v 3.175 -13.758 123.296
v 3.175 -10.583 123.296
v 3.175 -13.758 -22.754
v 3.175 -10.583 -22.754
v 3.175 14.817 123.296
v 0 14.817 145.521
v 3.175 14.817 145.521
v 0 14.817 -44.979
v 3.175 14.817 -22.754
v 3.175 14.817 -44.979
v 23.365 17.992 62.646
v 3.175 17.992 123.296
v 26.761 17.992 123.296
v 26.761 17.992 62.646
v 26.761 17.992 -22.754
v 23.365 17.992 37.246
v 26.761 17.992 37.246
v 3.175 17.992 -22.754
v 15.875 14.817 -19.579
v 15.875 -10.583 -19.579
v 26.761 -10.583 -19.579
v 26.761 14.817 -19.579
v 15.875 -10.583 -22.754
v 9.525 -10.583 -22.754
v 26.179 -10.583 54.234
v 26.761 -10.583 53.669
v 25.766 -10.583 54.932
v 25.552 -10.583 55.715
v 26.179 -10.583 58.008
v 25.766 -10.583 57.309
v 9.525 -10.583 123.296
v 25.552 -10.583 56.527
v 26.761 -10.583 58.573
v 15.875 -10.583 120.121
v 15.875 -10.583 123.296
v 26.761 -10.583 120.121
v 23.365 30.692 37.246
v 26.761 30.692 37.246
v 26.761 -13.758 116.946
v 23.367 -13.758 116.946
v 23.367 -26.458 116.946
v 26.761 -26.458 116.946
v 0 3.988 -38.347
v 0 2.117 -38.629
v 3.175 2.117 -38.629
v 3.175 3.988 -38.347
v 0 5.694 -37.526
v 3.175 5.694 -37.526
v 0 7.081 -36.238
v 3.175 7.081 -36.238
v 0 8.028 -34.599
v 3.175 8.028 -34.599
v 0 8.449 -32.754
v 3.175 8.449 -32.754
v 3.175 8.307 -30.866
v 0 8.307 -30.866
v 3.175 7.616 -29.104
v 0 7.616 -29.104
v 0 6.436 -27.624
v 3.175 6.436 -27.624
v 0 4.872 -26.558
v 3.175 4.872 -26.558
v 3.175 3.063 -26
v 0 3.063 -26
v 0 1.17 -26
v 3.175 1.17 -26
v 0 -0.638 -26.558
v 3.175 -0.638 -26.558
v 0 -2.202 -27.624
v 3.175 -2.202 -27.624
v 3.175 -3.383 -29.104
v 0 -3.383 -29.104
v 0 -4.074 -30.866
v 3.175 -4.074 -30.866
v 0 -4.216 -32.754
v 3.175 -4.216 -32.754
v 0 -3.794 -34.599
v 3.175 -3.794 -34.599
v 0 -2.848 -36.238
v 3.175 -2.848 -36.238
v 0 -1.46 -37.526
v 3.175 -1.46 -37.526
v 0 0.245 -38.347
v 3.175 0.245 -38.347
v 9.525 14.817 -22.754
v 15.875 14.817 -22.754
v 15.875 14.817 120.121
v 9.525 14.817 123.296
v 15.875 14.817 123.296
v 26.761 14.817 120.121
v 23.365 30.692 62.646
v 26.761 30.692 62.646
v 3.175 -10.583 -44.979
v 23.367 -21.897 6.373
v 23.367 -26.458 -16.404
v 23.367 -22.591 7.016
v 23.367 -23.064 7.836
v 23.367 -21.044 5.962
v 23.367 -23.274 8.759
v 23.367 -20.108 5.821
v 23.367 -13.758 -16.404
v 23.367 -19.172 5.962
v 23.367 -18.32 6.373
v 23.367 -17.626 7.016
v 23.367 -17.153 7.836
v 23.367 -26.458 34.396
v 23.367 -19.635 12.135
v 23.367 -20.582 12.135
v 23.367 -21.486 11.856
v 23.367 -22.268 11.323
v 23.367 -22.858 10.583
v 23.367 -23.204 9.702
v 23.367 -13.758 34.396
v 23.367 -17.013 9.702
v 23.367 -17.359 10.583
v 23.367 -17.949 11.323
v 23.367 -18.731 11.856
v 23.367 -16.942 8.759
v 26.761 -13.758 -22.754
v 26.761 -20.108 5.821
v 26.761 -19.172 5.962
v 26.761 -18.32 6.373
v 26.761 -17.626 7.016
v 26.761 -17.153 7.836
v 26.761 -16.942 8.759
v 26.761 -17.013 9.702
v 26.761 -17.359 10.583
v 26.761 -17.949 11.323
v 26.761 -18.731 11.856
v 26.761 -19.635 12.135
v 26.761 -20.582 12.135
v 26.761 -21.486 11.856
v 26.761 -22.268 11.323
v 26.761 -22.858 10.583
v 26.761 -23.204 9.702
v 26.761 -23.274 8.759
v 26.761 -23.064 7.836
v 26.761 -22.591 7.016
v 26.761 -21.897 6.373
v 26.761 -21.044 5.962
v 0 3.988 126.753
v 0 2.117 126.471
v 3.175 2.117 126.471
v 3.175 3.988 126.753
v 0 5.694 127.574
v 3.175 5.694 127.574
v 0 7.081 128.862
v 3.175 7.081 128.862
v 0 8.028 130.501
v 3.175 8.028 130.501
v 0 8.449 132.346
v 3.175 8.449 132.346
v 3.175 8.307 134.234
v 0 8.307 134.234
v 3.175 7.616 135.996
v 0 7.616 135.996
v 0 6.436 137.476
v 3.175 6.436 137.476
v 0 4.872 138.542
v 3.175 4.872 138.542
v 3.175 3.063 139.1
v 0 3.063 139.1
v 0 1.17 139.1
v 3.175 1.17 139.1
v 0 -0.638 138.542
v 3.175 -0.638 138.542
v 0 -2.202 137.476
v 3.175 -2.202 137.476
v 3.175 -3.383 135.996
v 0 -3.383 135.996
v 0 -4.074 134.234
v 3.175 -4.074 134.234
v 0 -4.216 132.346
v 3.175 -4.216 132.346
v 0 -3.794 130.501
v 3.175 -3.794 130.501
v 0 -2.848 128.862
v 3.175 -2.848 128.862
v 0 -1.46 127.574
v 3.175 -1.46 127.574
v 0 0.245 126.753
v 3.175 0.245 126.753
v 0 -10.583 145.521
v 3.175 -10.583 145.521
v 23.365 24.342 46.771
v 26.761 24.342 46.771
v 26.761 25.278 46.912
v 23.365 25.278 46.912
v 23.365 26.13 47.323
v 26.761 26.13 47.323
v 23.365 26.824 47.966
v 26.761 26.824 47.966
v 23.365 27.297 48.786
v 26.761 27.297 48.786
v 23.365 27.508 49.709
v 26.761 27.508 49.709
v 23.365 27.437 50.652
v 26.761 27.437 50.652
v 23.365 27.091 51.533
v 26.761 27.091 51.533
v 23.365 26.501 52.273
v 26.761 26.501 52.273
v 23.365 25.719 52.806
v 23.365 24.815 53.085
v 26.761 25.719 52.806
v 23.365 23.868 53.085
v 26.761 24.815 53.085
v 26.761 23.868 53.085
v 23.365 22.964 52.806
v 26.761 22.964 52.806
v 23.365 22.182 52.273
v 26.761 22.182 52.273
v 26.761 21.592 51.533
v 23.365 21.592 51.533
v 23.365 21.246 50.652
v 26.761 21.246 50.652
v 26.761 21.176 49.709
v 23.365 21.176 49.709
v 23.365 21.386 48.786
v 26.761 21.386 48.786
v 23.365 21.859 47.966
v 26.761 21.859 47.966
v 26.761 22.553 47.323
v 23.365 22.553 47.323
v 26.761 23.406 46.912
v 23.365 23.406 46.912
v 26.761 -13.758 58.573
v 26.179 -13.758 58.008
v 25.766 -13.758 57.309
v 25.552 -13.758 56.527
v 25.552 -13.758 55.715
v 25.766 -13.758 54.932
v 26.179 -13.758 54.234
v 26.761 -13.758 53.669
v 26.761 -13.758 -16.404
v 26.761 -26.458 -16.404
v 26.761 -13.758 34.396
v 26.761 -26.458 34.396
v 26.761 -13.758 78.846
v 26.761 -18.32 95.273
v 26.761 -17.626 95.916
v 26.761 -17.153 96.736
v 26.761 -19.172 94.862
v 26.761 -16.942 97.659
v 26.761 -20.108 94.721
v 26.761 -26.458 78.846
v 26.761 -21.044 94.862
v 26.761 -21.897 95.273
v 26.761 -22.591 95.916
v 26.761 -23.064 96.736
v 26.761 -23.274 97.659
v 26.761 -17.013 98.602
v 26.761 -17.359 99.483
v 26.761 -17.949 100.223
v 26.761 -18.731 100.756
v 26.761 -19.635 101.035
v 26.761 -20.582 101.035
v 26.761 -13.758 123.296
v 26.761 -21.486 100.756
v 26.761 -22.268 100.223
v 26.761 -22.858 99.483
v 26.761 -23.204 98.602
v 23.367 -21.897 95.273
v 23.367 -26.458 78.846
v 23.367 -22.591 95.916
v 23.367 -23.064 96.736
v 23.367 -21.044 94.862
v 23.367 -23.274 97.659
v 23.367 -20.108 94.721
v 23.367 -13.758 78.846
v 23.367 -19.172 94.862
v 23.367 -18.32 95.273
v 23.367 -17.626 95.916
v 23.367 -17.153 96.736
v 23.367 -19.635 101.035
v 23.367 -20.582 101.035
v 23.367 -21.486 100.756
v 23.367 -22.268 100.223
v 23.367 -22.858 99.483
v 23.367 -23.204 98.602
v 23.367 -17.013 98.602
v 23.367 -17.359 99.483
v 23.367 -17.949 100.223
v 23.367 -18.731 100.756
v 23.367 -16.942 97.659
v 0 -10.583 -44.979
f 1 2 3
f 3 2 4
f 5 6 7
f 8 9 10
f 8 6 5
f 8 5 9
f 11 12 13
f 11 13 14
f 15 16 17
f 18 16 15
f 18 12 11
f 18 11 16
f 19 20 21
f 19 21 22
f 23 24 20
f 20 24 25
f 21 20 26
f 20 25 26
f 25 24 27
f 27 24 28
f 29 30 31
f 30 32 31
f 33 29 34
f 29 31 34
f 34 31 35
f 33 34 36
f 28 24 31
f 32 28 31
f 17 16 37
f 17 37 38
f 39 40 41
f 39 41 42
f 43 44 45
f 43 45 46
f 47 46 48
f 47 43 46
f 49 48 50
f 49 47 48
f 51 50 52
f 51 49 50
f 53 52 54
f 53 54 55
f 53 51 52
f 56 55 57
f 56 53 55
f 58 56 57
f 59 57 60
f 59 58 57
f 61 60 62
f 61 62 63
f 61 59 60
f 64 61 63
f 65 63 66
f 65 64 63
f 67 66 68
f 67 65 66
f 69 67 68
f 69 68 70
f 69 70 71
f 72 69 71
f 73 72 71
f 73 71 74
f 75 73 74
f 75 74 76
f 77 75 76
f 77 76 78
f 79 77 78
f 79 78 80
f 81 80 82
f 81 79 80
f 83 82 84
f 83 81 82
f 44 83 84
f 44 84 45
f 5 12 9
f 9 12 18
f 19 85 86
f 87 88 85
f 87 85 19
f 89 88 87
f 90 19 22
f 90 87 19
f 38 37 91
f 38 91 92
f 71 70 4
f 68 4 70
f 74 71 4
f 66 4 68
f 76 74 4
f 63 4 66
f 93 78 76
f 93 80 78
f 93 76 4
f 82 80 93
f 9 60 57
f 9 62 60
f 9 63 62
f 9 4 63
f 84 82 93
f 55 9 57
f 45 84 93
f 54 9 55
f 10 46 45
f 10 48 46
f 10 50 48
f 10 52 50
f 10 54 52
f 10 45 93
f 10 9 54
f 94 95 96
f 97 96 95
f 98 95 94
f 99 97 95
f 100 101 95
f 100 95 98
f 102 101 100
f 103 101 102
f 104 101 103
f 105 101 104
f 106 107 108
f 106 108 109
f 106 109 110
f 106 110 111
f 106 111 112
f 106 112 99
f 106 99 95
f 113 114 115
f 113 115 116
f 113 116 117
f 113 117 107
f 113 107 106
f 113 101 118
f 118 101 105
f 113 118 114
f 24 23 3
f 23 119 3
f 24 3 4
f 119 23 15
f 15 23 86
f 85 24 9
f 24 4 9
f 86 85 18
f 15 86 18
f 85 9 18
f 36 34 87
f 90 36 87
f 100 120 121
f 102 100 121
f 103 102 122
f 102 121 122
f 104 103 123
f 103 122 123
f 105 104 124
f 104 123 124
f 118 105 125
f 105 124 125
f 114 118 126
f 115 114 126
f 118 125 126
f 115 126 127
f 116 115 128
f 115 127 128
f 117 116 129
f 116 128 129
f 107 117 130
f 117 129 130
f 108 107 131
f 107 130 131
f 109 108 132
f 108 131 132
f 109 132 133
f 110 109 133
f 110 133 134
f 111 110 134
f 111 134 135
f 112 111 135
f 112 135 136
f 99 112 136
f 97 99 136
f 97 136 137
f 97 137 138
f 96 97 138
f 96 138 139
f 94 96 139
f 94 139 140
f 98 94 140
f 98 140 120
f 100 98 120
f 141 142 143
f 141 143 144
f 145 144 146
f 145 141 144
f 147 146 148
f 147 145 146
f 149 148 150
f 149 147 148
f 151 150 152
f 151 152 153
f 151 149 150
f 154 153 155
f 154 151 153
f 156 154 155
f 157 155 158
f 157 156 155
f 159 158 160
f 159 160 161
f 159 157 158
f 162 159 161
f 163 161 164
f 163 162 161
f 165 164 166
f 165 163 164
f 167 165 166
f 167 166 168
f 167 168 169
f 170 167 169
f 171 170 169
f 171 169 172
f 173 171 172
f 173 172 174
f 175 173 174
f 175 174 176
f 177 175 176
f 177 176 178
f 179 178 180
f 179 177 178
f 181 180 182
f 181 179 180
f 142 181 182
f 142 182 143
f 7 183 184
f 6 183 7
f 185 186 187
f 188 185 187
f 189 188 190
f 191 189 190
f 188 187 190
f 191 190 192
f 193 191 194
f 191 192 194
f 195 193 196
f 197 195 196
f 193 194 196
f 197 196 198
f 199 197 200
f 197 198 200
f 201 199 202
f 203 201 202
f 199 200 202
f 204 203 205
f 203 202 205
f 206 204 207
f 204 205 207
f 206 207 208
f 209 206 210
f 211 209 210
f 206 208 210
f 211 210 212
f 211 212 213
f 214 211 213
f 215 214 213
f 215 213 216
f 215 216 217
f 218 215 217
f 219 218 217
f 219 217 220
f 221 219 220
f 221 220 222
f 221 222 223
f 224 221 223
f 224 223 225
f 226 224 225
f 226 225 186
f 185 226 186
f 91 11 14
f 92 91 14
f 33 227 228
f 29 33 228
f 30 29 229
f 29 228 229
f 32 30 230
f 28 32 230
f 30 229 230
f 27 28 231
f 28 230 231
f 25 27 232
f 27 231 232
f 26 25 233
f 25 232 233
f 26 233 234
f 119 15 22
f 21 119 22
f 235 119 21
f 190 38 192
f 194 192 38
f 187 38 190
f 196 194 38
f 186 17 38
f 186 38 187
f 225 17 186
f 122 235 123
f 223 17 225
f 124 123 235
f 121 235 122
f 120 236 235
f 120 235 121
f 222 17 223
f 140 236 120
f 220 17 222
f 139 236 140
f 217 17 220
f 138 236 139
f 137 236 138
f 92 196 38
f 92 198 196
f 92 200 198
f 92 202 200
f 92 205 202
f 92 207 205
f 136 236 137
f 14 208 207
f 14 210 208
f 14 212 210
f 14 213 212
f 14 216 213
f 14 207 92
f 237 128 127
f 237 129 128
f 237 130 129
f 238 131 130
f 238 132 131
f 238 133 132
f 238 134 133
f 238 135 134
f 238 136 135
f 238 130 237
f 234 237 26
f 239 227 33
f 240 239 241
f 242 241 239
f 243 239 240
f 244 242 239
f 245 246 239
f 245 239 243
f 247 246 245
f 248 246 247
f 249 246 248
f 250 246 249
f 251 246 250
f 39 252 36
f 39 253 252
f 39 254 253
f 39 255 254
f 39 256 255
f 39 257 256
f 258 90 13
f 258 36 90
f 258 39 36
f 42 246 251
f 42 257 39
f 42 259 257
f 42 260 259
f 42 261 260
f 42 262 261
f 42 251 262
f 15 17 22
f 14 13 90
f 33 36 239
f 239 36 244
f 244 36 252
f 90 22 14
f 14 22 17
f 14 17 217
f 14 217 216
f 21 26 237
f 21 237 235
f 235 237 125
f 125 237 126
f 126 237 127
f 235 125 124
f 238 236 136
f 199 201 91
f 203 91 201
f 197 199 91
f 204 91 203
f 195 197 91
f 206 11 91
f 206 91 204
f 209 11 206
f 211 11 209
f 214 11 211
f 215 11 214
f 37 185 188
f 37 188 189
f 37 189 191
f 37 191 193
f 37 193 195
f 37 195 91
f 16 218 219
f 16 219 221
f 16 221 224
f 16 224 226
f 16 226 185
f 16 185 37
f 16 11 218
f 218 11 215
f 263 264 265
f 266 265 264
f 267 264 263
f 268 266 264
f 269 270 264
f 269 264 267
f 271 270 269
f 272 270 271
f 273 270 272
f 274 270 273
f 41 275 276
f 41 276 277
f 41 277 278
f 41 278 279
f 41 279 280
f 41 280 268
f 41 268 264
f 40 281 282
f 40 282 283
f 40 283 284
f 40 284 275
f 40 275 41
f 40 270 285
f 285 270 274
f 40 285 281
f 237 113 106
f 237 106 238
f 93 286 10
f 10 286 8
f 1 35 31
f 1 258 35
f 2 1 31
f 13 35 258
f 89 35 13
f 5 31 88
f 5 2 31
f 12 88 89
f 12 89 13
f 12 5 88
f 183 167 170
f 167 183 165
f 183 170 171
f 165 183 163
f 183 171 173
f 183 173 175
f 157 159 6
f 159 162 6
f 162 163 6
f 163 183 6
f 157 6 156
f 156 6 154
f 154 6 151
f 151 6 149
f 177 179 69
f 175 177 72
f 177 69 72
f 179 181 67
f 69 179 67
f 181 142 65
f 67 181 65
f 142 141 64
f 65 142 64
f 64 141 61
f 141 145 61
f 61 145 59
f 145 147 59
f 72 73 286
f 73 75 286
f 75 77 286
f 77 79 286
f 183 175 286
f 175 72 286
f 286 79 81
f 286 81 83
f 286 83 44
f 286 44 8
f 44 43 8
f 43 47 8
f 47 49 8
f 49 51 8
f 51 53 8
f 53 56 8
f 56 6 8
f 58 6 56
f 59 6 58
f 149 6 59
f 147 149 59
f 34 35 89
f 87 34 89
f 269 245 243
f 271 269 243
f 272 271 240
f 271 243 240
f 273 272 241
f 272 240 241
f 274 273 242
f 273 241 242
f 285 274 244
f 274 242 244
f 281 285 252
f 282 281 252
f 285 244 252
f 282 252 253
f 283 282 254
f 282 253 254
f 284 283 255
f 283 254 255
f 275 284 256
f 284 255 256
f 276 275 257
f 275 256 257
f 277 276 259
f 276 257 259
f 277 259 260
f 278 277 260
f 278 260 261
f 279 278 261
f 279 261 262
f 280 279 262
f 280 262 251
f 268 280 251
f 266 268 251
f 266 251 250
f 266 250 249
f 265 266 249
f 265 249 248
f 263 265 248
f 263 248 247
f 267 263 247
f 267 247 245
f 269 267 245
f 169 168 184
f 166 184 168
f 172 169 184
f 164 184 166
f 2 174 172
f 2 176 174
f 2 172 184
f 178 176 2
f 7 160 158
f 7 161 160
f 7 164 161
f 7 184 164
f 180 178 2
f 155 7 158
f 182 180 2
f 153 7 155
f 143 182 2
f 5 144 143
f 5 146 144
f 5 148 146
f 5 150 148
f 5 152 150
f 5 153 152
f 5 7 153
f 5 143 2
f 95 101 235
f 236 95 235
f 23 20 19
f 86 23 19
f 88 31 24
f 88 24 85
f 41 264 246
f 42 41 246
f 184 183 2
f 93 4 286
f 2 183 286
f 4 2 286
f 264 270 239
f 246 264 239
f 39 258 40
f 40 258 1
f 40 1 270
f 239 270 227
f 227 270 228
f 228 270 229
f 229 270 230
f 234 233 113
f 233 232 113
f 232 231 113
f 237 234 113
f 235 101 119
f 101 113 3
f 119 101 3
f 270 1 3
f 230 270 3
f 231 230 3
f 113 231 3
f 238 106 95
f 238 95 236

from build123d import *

# Parameters (mm, degrees)
SKETCH1_W               = 190.5
SKETCH1_H               = 25.4
SKETCH1_R               = 6.35
BOSS_EXTRUDE1_DEPTH     = 3.175
SKETCH2_W               = 146.05
SKETCH2_H               = 3.175
BOSS_EXTRUDE2_DEPTH     = 47.625
BOSS_EXTRUDE2_2_DEPTH   = 47.625
SKETCH3_W               = 146.05
SKETCH3_H               = 25.4
BOSS_EXTRUDE4_DEPTH     = 6.35
SKETCH4_W               = 3.175
SKETCH4_H               = 25.4
BOSS_EXTRUDE5_DEPTH     = 41.275
SKETCH5_W               = 6.35
SKETCH5_H               = 25.4
CUT_EXTRUDE1_DEPTH      = 165.45
SKETCH7_W               = 146.05
SKETCH7_H               = 31.75
BOSS_EXTRUDE7_DEPTH     = 3.175
FILLET1_R               = 10
SKETCH8_R               = 3.05
CUT_EXTRUDE2_DEPTH      = 3.175
SKETCH9_W               = 6.35
SKETCH9_H               = 38.1
SKETCH9_H_2             = 50.8
BOSS_EXTRUDE8_DEPTH     = 12.7
SKETCH10_R              = 3.175
CUT_EXTRUDE3_DEPTH      = 12.7
SKETCH11_W              = 6.35
SKETCH11_H              = 25.4
BOSS_EXTRUDE9_DEPTH     = 12.7
SKETCH12_R              = 3.175
CUT_EXTRUDE4_DEPTH      = 12.7
SKETCH13_W              = 28.740264125
SKETCH13_H              = 146.120317421
CUT_EXTRUDE5_DEPTH      = 50.8
CUT_EXTRUDE5_DEPTH_BACK = 50.8


with BuildPart() as part:
    # Sketch1 → Boss-Extrude1 (new body)
    with BuildSketch(Plane(origin=(0, 0, 0), x_dir=(0, 0, -1), z_dir=(1, 0, 0))):
        with Locations((-50.270833333, 2.116666667)):
            Rectangle(SKETCH1_W, SKETCH1_H)
        with Locations((32.279166667, 2.116666667)):
            Circle(SKETCH1_R, mode=Mode.SUBTRACT)
        with Locations((-132.820833333, 2.116666667)):
            Circle(SKETCH1_R, mode=Mode.SUBTRACT)
    extrude(amount=BOSS_EXTRUDE1_DEPTH)



with BuildPart() as body_2:
    # Sketch2 → Boss-Extrude2 (new body)
    with BuildSketch(Plane(origin=(3.175, 0, 0), x_dir=(0, 0, -1), z_dir=(1, 0, 0))):
        with Locations((-50.270833333, 16.404166667)):
            Rectangle(SKETCH2_W, SKETCH2_H)
    extrude(amount=BOSS_EXTRUDE2_DEPTH)


with BuildPart() as body_3:
    # Sketch2 → Boss-Extrude2 2 (new body)
    with BuildSketch(Plane(origin=(3.175, 0, 0), x_dir=(0, 0, -1), z_dir=(1, 0, 0))):
        with Locations((-50.270833333, -12.170833333)):
            Rectangle(SKETCH2_W, SKETCH2_H)
    extrude(amount=BOSS_EXTRUDE2_2_DEPTH)


with BuildPart() as part_1:
    add(part.part)

    add(body_2.part)  # Boss-Extrude4 merges body 2

    add(body_3.part)  # Boss-Extrude4 merges body 3
    # Sketch3 → Boss-Extrude4 (add)
    with BuildSketch(Plane(origin=(3.175, 0, 0), x_dir=(0, 0, -1), z_dir=(1, 0, 0))):
        with Locations((-50.270833333, 2.116666667)):
            Rectangle(SKETCH3_W, SKETCH3_H)
    extrude(amount=BOSS_EXTRUDE4_DEPTH)

    # Sketch4 → Boss-Extrude5 (add)
    with BuildSketch(Plane(origin=(9.525, 0, 0), x_dir=(0, 0, -1), z_dir=(1, 0, 0))):
        with Locations((-121.708333333, 2.116666667)):
            Rectangle(SKETCH4_W, SKETCH4_H)
        with Locations((21.166666667, 2.116666667)):
            Rectangle(SKETCH4_W, SKETCH4_H)
    extrude(amount=BOSS_EXTRUDE5_DEPTH)

    # Sketch5 → Cut-Extrude1 (cut)
    with BuildSketch(Plane.XY.offset(123.295833333)):
        with Locations((12.7, 2.116666667)):
            Rectangle(SKETCH5_W, SKETCH5_H)
    extrude(amount=-CUT_EXTRUDE1_DEPTH, mode=Mode.SUBTRACT)

    # Sketch7 → Boss-Extrude7 (add)
    with BuildSketch(Plane(origin=(50.8, 0, 0), x_dir=(0, 0, -1), z_dir=(1, 0, 0))):
        with Locations((-50.270833333, 2.116666667)):
            Rectangle(SKETCH7_W, SKETCH7_H)
    extrude(amount=BOSS_EXTRUDE7_DEPTH)

    # Fillet1
    fillet1_edges = [part_1.edges().sort_by_distance(p)[0] for p in [
        (53.975, 2.116666667, 123.295833333),
        (53.975, -13.758333333, 50.270833333),
        (53.975, 2.116666667, -22.754166667),
        (53.975, 17.991666667, 50.270833333),
    ]]
    fillet(fillet1_edges, radius=FILLET1_R)

    # Sketch8 → Cut-Extrude2 (cut)
    with BuildSketch(Plane.XZ.offset(13.758333333)):
        with Locations((28.575, 56.120833333)):
            Circle(SKETCH8_R)
    extrude(amount=-CUT_EXTRUDE2_DEPTH, mode=Mode.SUBTRACT)

    # Sketch9 → Boss-Extrude8 (add)
    with BuildSketch(Plane.XZ.offset(13.758333333)):
        with Locations((26.541679323, 97.895833333)):
            Rectangle(SKETCH9_W, SKETCH9_H)
        with Locations((26.541679323, 8.995833333)):
            Rectangle(SKETCH9_W, SKETCH9_H_2)
    extrude(amount=BOSS_EXTRUDE8_DEPTH)

    # Sketch10 → Cut-Extrude3 (cut)
    with BuildSketch(Plane(origin=(29.716679323, 0, 0), x_dir=(0, 0, -1), z_dir=(1, 0, 0))):
        with Locations((-97.895833333, -20.108333333)):
            Circle(SKETCH10_R)
        with Locations((-8.995833333, -20.108333333)):
            Circle(SKETCH10_R)
    extrude(amount=-CUT_EXTRUDE3_DEPTH, mode=Mode.SUBTRACT)

    # Sketch11 → Boss-Extrude9 (add)
    with BuildSketch(Plane(origin=(0, 17.991666667, 0), x_dir=(1, 0, 0), z_dir=(0, 1, 0))):
        with Locations((26.54, -49.945833333)):
            Rectangle(SKETCH11_W, SKETCH11_H)
    extrude(amount=BOSS_EXTRUDE9_DEPTH)

    # Sketch12 → Cut-Extrude4 (cut)
    with BuildSketch(Plane(origin=(29.715, 0, 0), x_dir=(0, 0, -1), z_dir=(1, 0, 0))):
        with Locations((-49.945833333, 24.341666667)):
            Circle(SKETCH12_R)
    extrude(amount=-CUT_EXTRUDE4_DEPTH, mode=Mode.SUBTRACT)

    # Sketch13 → Cut-Extrude5 (cut, two sides)
    with BuildSketch(Plane.XZ.offset(13.758333333)) as cut_extrude5_sk:
        with Locations((41.13133077, 50.235674622)):
            Rectangle(SKETCH13_W, SKETCH13_H)
    extrude(amount=CUT_EXTRUDE5_DEPTH, mode=Mode.SUBTRACT)
    extrude(cut_extrude5_sk.sketch, amount=-CUT_EXTRUDE5_DEPTH_BACK, mode=Mode.SUBTRACT)


solid = part_1.part
